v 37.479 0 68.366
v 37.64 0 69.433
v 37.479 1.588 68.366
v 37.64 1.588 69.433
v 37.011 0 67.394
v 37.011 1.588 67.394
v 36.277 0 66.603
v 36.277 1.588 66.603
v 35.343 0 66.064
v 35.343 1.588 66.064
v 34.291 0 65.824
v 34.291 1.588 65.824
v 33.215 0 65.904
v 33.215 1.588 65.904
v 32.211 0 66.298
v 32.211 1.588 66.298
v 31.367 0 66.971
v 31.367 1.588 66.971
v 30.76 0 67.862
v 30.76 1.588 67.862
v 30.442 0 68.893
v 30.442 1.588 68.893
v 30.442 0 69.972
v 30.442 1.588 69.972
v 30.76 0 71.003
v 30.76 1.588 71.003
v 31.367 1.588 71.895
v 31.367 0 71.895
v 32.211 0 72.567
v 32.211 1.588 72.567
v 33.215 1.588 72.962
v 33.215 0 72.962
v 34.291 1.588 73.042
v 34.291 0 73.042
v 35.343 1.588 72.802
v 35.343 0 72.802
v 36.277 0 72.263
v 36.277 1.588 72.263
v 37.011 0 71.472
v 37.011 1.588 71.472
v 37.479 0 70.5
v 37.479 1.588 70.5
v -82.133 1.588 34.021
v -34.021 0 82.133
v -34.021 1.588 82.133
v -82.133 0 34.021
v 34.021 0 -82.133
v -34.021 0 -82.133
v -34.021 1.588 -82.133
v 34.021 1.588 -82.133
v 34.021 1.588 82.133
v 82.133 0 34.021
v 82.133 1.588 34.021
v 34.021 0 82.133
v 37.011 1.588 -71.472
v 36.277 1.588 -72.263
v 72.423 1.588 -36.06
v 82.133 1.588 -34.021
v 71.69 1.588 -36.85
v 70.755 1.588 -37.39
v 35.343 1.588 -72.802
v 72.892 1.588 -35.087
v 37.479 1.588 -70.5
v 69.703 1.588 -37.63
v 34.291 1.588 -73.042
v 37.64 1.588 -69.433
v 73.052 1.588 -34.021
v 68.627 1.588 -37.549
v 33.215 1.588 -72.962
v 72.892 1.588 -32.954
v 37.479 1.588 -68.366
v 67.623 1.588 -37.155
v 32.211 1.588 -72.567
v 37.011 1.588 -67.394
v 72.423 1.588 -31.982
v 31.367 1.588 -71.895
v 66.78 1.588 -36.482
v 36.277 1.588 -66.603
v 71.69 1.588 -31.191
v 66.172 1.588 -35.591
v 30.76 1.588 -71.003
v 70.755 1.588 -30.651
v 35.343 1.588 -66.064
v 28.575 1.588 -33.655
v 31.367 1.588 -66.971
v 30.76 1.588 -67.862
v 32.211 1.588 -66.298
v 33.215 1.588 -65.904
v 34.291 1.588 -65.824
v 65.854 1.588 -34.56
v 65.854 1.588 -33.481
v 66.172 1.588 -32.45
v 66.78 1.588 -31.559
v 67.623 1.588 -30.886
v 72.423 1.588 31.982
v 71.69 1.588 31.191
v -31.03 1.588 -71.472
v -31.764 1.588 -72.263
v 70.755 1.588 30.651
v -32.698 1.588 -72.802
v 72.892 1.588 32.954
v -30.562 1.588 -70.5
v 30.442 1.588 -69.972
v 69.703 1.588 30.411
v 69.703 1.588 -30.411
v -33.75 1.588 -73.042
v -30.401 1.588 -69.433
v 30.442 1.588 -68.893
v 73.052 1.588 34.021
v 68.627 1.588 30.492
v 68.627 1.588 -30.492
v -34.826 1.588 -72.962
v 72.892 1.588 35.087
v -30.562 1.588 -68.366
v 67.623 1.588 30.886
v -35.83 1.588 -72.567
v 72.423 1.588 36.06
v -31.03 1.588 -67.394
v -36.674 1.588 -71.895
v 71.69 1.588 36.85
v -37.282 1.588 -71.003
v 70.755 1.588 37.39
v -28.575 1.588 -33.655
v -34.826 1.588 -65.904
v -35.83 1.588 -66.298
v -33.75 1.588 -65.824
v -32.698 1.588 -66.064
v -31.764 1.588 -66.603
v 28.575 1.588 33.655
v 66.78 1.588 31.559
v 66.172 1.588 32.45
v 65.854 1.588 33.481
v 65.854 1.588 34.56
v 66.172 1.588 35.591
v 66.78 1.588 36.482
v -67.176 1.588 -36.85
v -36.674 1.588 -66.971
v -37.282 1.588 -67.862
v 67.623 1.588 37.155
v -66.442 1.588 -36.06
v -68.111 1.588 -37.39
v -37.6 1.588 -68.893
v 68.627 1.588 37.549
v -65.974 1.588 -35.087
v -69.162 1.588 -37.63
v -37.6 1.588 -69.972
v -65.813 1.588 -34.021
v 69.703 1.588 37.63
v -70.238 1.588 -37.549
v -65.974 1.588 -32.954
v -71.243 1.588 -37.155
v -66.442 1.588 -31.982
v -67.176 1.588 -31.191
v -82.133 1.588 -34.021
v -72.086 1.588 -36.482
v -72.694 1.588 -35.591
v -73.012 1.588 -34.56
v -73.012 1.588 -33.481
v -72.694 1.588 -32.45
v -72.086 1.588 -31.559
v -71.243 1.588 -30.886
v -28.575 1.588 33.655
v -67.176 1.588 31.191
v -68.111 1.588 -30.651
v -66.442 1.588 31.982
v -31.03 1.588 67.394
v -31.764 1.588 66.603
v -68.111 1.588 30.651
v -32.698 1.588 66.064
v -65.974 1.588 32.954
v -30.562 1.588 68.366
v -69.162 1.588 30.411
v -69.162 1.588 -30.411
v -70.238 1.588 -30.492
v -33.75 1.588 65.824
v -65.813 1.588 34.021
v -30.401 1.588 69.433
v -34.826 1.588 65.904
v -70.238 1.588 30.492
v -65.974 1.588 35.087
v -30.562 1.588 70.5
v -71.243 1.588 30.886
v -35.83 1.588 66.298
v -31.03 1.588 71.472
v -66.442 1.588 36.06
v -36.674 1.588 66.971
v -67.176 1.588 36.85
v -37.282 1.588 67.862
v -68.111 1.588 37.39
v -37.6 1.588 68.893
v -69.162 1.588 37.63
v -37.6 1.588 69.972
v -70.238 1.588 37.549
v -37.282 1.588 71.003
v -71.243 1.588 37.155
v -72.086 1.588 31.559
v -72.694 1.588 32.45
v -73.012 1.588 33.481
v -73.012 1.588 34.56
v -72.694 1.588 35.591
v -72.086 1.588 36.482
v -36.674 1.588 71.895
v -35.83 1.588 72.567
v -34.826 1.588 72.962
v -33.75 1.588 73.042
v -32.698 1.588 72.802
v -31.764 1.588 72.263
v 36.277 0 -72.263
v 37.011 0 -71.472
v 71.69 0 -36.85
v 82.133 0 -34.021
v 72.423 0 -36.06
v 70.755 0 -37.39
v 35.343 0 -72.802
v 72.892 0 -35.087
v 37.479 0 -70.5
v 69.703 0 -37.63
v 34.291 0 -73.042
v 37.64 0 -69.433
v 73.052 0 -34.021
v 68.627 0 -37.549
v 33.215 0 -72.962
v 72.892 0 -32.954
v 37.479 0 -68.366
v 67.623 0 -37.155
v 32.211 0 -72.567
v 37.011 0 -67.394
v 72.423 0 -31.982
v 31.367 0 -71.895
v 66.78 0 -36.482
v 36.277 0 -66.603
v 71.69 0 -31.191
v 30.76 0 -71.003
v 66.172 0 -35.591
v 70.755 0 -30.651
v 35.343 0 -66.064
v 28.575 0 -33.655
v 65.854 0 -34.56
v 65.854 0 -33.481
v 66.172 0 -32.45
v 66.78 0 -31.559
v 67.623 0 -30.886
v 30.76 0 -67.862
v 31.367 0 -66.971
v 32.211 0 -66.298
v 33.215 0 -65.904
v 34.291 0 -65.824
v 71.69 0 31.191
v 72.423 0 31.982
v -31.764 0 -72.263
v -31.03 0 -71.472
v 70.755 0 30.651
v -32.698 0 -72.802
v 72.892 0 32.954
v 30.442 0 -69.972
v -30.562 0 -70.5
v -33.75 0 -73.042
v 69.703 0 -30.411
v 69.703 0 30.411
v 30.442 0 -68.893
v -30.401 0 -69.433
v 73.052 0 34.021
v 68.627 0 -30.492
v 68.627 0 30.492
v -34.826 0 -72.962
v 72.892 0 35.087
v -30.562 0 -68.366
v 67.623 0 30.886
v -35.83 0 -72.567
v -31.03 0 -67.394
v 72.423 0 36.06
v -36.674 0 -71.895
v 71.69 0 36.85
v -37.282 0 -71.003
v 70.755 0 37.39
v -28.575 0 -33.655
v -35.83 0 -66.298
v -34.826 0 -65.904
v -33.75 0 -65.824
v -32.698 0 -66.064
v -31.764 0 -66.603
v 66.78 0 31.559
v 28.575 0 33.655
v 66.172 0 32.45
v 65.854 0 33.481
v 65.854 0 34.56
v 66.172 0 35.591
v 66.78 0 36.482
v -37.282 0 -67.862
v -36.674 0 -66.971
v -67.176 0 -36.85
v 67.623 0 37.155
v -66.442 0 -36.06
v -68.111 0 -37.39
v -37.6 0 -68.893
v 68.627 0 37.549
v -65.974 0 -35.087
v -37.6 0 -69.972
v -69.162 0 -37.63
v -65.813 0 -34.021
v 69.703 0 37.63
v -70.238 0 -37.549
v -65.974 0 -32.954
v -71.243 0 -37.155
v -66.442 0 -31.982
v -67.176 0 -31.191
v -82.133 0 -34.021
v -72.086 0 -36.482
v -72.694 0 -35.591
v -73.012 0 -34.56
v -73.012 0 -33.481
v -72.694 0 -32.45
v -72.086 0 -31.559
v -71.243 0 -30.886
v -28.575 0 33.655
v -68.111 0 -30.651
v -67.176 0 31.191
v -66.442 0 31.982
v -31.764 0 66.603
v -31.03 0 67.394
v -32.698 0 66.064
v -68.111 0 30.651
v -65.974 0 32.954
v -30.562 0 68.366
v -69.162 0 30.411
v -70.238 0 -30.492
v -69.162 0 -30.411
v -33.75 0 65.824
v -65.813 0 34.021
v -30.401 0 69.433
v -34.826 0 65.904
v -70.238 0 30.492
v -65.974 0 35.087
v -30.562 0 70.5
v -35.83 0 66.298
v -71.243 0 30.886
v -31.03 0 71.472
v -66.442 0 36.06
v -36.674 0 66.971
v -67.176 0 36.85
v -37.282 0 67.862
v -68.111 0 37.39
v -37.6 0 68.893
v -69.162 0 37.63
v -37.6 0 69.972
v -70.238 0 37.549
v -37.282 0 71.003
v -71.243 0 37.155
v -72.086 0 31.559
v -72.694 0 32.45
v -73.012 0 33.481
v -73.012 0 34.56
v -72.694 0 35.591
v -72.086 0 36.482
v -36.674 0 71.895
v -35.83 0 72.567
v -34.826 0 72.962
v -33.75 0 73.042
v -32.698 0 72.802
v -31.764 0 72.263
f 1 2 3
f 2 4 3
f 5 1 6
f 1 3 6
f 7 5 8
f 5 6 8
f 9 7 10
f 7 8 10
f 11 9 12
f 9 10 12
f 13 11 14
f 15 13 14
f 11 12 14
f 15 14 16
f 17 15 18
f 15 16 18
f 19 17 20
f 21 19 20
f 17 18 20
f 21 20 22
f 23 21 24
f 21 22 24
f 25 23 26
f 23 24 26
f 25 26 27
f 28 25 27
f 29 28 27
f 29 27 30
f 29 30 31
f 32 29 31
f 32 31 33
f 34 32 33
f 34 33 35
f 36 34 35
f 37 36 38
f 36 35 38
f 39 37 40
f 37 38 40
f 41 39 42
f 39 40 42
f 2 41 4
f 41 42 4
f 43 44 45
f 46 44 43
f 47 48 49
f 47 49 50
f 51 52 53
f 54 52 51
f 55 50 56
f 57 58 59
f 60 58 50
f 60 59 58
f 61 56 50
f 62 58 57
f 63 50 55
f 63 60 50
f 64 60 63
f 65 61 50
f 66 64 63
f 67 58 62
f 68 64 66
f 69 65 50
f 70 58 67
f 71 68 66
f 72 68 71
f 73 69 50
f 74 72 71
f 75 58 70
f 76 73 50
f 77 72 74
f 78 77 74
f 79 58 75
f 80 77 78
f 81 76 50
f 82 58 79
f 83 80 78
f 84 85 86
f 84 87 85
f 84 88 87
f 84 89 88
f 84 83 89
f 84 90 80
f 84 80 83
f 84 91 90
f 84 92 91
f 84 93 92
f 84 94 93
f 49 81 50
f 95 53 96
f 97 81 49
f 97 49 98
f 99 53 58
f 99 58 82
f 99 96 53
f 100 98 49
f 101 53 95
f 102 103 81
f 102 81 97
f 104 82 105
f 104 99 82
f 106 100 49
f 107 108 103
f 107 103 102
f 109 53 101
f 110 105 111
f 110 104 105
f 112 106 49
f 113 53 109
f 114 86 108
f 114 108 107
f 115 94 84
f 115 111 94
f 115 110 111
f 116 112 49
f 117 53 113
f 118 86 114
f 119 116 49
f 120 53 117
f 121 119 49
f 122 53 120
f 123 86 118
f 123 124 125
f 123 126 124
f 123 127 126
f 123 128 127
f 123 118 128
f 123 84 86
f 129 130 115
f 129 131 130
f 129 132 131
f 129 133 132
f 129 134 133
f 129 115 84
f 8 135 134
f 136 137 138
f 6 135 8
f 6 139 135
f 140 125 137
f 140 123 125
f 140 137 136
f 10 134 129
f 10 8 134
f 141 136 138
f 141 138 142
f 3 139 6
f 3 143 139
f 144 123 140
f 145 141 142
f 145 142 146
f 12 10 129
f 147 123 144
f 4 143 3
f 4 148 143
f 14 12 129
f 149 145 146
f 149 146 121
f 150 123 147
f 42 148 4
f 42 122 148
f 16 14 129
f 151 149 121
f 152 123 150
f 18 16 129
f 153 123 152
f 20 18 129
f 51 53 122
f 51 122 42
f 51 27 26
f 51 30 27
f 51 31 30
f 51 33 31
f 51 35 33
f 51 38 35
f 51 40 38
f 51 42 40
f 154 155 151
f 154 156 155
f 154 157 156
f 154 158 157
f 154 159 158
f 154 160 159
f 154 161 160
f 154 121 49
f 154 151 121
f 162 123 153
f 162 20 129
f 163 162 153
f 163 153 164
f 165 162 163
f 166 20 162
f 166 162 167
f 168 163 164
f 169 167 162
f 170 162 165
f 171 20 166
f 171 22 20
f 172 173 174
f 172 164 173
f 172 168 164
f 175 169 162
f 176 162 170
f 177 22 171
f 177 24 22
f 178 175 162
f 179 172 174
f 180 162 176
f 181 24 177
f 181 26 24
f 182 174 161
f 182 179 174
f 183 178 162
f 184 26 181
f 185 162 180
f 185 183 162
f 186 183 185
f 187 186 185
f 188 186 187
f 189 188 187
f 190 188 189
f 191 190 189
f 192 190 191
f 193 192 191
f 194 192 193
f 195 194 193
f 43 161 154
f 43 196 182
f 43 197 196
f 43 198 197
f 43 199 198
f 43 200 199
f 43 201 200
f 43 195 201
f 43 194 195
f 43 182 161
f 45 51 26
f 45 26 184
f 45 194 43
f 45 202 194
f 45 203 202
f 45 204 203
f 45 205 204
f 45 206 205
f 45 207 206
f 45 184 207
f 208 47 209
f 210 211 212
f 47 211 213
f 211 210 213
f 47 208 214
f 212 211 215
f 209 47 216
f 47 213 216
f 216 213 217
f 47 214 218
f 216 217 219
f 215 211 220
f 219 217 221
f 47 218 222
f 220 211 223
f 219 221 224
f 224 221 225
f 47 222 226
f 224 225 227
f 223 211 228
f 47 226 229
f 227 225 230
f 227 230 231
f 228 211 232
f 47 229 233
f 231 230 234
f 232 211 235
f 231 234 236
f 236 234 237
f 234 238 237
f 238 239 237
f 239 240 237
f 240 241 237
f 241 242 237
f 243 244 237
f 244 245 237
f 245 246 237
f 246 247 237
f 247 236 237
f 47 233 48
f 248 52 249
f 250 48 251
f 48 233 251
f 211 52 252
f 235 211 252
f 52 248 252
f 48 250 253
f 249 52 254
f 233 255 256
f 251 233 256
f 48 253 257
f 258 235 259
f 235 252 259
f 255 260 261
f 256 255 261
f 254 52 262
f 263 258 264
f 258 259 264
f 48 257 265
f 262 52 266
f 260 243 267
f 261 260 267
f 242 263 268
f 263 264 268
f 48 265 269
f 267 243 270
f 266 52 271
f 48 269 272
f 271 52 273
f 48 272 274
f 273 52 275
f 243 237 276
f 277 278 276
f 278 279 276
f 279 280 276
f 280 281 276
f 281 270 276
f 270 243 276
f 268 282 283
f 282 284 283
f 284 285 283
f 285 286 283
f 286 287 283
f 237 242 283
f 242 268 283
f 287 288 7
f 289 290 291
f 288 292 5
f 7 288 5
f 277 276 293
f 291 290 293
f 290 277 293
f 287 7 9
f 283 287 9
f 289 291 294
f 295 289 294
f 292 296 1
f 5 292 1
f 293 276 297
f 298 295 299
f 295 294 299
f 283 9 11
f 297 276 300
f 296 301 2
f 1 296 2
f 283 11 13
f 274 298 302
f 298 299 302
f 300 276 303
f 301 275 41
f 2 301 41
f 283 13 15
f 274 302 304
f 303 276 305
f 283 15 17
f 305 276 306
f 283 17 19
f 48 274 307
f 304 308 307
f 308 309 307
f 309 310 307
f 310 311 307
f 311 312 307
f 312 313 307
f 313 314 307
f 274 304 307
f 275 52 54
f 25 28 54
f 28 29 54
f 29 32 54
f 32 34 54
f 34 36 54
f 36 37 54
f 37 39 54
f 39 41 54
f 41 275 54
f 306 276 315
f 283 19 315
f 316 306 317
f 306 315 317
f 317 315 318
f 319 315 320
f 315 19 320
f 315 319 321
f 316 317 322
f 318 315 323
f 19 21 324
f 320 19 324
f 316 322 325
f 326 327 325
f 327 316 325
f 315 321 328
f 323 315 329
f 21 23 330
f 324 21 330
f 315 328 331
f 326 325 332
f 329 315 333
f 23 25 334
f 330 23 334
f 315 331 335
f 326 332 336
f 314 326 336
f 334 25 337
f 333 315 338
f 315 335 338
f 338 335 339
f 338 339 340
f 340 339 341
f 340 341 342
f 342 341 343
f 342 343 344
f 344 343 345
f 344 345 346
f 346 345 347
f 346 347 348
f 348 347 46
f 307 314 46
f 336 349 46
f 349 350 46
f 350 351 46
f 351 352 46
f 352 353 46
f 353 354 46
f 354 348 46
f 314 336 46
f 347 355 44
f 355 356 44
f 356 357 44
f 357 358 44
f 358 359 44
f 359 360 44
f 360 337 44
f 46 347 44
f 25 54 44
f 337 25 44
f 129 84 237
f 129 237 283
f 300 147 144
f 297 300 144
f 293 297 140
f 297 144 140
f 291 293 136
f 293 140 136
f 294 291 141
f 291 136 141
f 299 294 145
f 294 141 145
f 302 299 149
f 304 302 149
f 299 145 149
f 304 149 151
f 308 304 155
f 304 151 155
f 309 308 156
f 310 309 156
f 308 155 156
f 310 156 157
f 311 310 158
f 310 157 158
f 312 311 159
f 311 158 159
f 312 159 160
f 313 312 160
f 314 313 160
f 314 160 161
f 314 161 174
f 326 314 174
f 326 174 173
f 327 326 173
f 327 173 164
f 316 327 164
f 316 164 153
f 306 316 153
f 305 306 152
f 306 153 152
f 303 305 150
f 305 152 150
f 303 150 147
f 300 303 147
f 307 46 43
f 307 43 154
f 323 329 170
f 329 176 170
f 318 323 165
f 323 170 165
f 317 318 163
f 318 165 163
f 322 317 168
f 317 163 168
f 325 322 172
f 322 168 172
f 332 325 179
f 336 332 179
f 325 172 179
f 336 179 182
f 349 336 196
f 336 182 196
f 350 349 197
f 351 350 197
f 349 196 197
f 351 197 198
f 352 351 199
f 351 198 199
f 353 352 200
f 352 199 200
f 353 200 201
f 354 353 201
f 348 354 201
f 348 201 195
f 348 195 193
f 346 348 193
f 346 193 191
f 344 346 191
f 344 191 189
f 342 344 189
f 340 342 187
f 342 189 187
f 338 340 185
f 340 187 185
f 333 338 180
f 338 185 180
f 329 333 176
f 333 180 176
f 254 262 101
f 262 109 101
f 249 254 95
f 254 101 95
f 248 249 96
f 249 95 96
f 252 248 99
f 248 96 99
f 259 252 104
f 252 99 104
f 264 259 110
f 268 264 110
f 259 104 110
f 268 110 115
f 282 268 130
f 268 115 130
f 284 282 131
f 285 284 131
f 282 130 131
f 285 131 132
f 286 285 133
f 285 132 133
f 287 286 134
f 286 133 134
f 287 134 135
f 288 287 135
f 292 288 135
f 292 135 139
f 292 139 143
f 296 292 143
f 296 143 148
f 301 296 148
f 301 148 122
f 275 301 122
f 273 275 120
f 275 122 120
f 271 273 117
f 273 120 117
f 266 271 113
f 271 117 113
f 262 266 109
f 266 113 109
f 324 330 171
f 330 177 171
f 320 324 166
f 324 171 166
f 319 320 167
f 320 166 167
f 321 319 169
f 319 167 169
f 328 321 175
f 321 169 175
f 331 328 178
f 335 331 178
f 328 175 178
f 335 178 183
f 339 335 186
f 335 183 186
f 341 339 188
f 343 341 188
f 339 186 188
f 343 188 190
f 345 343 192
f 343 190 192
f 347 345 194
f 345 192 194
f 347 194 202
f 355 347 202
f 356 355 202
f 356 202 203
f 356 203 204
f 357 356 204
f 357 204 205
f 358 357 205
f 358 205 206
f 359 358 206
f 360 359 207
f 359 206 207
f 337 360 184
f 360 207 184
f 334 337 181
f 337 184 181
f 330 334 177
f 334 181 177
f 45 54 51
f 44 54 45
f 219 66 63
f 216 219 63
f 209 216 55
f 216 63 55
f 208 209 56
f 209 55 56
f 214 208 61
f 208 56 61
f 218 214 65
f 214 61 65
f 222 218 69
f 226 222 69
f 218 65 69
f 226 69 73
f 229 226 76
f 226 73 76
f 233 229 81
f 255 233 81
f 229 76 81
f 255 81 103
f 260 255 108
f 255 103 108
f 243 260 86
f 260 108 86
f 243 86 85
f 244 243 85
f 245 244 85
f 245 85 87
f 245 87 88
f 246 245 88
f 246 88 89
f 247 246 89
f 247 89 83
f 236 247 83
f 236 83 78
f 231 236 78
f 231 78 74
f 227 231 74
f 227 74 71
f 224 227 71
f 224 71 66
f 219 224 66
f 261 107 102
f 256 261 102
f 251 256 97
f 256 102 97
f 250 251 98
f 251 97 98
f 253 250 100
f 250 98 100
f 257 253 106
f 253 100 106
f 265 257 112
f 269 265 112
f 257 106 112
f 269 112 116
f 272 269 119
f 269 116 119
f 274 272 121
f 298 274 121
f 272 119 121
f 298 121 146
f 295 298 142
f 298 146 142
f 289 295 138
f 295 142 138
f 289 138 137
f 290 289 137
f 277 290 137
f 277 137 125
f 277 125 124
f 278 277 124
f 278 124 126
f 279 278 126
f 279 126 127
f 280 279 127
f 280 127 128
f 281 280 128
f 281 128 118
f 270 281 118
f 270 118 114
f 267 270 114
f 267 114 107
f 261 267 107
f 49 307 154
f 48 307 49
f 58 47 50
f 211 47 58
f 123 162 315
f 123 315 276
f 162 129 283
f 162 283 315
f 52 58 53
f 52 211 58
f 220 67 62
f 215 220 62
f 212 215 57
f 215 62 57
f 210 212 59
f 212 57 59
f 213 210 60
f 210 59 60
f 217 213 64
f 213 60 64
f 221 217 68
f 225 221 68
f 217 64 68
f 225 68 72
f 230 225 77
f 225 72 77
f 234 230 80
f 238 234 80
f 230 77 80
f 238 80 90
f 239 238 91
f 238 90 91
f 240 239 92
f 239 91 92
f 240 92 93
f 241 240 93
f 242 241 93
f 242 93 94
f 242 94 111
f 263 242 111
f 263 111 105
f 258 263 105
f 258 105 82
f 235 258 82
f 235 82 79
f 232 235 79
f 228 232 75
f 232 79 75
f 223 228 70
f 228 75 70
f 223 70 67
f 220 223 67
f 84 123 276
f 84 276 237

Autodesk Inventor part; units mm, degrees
ref_plane "YZ Plane" through (0, 0, 0) normal (1, 0, 0) x (0, 1, 0)
ref_plane "XZ Plane" through (0, 0, 0) normal (0, 1, 0) x (-1, 0, 0)
ref_plane "XY Plane" through (0, 0, 0) normal (0, 0, 1) x (1, 0, 0)
sketch "Sketch1" plane through (0, 0, 0) normal (0, 1, 0) x (-1, 0, 0)
  circle A0 centre (0, 0) radius 88.9
  line L0 (0, 0) -> (121.8821, 50.4852)
  line L1 (0, 0) -> (0, 134.8176)
  line L2 (82.1329, 34.0206) -> (82.1329, -34.0206)
  line L3 (82.1329, -34.0206) -> (34.0206, -82.1329)
  line L4 (34.0206, -82.1329) -> (-34.0206, -82.1329)
  line L5 (-34.0206, -82.1329) -> (-82.1329, -34.0206)
  line L6 (-82.1329, -34.0206) -> (-82.1329, 34.0206)
  line L7 (-82.1329, 34.0206) -> (-34.0206, 82.1329)
  line L8 (-34.0206, 82.1329) -> (34.0206, 82.1329)
  line L9 (34.0206, 82.1329) -> (82.1329, 34.0206)
  dimension "d0" = 177.8
  dimension "d1" = 67.5
  dimension "d2" = 164.2658
extrude "Extrusion1" add sketch "Sketch1" along normal blind 1.5875 contours L2 L3 L4 L5 L6 L7 L8 L1 L0 | L0 L1 L8 L9
sketch "Sketch2" plane through (0, 1.5875, 0) normal (0, 1, 0) x (1, 0, 0)
  line L0 (28.575, -33.655) -> (-28.575, -33.655)
  line L1 (-28.575, -33.655) -> (-28.575, 33.655)
  line L2 (-28.575, 33.655) -> (28.575, 33.655)
  line L3 (28.575, 33.655) -> (28.575, -33.655)
  line L4 (28.575, -33.655) -> (-28.575, 33.655) construction
  line L5 (-28.575, -33.655) -> (28.575, 33.655) construction
  point P0 (0, 0)
  dimension "d5" = 57.15
  dimension "d6" = 67.31
extrude "Extrusion2" cut sketch "Sketch2" against normal through all
sketch "Sketch3" plane through (0, 1.5875, 0) normal (0, 1, 0) x (1, 0, 0)
  circle A0 centre (-69.4329, -34.0206) radius 3.6195
  line L0 (-82.1329, 34.0206) -> (-82.1329, -34.0206) projected
  line L1 (-91.914, 0) -> (-48.5333, 0)
  circle A1 centre (-69.4329, 34.0206) radius 3.6195
  circle A2 centre (-34.0206, -69.4329) radius 3.6195
  circle A3 centre (34.0206, -69.4329) radius 3.6195
  circle A4 centre (69.4329, -34.0206) radius 3.6195
  circle A5 centre (69.4329, 34.0206) radius 3.6195
  circle A6 centre (34.0206, 69.4329) radius 3.6195
  circle A7 centre (-34.0206, 69.4329) radius 3.6195
  point P0 (0, 0)
  dimension "d9" = 7.239
  dimension "d10" = 12.7
  dimension "d11" = 0
  dimension "d14" = 360
extrude "Extrusion3" cut sketch "Sketch3" against normal through all
properties part number "Layer"
